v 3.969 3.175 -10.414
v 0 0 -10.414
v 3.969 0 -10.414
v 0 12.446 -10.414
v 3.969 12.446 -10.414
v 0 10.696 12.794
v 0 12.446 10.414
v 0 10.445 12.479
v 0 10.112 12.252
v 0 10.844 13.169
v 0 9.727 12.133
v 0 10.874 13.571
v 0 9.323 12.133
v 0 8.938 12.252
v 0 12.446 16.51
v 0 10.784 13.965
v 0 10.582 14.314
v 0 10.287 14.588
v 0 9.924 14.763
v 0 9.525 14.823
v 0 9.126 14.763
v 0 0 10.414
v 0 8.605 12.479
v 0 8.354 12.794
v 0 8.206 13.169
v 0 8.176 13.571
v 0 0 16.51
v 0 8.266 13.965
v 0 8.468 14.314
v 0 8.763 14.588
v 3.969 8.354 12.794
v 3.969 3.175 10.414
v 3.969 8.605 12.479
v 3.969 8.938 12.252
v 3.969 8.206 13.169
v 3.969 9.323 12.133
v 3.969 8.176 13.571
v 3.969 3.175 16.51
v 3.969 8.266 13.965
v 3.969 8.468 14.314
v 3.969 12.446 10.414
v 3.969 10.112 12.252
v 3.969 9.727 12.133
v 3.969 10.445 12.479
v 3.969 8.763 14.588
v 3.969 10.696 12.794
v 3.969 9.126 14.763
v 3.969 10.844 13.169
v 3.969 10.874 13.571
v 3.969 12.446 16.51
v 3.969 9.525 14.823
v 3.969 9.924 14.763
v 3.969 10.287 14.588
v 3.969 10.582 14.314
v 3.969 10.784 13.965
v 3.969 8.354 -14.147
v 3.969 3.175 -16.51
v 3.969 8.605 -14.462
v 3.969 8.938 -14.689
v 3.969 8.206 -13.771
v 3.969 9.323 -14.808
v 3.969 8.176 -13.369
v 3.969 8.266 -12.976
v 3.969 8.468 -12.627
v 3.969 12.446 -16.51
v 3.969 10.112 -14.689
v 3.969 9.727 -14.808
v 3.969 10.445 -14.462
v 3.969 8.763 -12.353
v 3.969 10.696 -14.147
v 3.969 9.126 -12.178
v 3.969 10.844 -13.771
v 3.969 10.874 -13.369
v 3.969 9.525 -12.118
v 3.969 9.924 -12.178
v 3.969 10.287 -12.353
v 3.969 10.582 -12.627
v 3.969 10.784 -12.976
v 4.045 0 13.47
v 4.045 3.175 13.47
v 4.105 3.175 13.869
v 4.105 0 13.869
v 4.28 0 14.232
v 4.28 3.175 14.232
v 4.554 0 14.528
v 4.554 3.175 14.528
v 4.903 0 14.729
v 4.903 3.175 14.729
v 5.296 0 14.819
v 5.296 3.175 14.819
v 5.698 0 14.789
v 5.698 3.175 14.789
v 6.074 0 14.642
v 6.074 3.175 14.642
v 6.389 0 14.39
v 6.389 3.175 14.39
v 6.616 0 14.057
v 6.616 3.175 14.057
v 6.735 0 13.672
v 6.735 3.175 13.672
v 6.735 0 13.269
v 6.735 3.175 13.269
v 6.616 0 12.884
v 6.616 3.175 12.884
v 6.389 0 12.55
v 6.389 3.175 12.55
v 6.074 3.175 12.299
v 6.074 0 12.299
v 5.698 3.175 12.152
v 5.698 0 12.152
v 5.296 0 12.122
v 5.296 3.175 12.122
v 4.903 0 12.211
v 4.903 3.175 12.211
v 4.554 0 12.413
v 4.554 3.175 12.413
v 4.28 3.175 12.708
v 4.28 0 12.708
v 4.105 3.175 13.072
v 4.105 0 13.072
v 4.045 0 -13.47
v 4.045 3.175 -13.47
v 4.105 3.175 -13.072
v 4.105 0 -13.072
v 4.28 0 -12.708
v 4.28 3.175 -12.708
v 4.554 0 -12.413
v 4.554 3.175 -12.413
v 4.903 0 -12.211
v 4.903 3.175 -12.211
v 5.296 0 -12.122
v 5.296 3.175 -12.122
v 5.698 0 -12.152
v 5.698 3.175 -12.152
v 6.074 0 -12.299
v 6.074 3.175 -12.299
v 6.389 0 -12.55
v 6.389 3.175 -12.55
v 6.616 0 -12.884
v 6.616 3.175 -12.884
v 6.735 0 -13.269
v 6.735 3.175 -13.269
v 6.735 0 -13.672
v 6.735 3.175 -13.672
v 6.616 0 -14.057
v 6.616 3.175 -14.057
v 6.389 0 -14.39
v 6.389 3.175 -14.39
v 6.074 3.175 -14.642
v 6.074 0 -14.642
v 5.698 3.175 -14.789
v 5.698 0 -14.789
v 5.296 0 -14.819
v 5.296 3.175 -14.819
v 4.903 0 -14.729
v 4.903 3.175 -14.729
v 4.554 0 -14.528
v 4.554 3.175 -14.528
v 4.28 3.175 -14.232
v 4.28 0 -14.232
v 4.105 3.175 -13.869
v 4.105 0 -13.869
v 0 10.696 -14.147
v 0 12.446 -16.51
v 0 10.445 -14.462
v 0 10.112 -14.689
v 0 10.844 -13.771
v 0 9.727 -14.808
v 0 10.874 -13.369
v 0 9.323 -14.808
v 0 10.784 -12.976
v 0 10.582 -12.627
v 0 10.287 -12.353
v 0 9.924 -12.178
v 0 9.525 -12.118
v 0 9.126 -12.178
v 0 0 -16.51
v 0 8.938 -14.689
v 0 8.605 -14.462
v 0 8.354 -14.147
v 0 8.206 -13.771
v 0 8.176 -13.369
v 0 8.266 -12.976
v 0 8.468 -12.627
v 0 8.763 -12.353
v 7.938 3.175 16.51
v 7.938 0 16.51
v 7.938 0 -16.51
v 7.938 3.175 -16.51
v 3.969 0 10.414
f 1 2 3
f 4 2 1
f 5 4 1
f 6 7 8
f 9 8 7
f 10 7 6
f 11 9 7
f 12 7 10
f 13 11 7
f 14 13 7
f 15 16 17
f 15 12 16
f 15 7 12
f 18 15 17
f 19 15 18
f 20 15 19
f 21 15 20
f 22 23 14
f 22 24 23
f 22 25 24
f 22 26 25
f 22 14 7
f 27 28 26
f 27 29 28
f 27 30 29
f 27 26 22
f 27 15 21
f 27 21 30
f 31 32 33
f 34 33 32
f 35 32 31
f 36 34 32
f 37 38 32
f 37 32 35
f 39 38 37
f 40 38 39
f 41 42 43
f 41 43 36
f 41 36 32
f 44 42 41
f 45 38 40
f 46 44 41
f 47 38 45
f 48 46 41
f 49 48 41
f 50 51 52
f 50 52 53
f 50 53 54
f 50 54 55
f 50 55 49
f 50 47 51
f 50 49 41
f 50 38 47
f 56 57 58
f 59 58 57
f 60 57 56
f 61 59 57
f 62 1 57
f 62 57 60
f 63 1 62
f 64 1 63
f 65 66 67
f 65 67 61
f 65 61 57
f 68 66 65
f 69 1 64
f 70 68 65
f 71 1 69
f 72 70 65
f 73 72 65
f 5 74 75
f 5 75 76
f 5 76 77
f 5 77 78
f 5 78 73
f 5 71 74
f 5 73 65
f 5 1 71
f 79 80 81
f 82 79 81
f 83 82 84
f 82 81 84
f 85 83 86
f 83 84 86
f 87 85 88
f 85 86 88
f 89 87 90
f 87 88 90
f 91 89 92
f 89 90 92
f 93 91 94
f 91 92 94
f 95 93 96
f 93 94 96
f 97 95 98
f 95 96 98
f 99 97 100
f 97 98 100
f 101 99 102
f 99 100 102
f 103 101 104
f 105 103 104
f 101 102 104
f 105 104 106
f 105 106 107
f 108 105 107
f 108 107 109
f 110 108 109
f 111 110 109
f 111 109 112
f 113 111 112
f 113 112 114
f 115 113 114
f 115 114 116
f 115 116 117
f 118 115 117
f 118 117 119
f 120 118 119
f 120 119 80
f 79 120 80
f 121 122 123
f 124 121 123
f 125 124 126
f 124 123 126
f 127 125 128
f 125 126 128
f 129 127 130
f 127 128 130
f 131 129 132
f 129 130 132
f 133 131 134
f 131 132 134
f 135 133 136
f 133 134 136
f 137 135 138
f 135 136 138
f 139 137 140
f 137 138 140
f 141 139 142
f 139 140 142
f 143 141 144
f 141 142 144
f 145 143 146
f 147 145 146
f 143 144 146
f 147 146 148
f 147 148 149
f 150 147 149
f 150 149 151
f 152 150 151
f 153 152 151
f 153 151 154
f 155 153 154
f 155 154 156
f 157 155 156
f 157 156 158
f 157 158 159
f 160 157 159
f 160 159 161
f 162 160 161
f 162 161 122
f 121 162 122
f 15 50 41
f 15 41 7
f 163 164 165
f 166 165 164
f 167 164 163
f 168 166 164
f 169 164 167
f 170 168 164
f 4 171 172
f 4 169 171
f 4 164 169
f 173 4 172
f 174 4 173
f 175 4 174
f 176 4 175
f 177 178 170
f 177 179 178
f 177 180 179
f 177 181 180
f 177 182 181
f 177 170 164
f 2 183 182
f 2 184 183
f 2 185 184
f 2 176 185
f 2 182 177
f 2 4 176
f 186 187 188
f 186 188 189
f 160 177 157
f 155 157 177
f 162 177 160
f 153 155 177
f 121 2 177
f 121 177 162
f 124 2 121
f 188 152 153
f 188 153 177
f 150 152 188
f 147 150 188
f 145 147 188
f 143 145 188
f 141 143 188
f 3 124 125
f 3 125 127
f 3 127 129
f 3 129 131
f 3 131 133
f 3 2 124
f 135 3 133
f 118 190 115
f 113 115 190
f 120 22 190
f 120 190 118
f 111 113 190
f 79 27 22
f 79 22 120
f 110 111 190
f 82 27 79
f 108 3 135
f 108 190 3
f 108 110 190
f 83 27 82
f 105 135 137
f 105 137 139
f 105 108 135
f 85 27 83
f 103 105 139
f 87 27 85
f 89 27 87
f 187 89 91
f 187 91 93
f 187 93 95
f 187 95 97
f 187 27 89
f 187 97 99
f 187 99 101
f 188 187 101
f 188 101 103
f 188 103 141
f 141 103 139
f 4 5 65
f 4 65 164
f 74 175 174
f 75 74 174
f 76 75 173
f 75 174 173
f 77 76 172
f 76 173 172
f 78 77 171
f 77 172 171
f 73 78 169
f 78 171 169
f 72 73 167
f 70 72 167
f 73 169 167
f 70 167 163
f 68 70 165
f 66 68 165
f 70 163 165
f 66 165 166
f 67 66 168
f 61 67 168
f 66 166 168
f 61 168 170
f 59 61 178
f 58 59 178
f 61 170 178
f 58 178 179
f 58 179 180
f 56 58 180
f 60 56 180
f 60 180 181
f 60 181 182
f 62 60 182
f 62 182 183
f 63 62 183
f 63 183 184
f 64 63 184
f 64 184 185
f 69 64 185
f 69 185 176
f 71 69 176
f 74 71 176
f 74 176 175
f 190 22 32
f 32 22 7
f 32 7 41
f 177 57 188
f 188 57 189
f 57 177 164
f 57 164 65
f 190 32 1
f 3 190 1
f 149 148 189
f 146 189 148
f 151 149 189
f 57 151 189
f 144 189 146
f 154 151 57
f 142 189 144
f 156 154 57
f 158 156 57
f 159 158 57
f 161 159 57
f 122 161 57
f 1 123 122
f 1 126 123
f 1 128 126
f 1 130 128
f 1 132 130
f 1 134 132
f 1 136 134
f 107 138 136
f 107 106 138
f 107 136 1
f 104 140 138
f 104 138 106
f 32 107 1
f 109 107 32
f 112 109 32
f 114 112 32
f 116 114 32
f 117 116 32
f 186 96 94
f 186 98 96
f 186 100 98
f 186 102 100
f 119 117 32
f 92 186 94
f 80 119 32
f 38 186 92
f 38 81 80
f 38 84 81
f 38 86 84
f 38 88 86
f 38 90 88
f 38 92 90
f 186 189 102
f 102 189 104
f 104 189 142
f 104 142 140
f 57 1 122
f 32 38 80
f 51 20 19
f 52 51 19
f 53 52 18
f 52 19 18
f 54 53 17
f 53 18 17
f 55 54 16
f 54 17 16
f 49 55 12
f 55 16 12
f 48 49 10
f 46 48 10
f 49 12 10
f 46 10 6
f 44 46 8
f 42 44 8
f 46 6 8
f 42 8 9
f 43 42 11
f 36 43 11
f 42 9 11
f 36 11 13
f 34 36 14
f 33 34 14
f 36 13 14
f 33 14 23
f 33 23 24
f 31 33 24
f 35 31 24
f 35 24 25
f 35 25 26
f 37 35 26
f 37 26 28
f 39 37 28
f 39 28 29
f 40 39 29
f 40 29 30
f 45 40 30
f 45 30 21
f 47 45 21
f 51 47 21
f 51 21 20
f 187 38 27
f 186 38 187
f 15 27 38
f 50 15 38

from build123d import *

# Parameters (mm, degrees)
BOSS_EXTRUDE1_DEPTH       = 16.51
CUT_EXTRUDE1_REACH        = 14.446
SKETCH2_W                 = 3.96875
SKETCH2_H                 = 20.828
F_6_32_TAPPED_HOLE1_D     = 2.7051
F_6_32_TAPPED_HOLE1_DEPTH = 3.96875
F_6_32_TAPPED_HOLE2_D     = 2.7051
F_6_32_TAPPED_HOLE2_DEPTH = 3.175


with BuildPart() as part:
    # Sketch1 → Boss-Extrude1 (new body, symmetric)
    with BuildSketch(Plane.XY):
        Polygon((0, 12.446), (0, 0), (7.9375, 0), (7.9375, 3.175), (3.96875, 3.175), (3.96875, 12.446), align=None)
    extrude(amount=BOSS_EXTRUDE1_DEPTH, both=True)

    # Sketch2 → Cut-Extrude1 (cut, up to next)
    with BuildSketch(Plane(origin=(0, 12.446, 0), x_dir=(1, 0, 0), z_dir=(0, 1, 0)), mode=Mode.PRIVATE) as cut_extrude1_sk1:
        with Locations((1.984375, 0)):
            Rectangle(SKETCH2_W, SKETCH2_H)
    cut_extrude1_tool1 = extrude(cut_extrude1_sk1.sketch, amount=-CUT_EXTRUDE1_REACH, mode=Mode.PRIVATE) & part.part
    add(cut_extrude1_tool1.solids().sort_by_distance((1.984375, 12.446, 0))[0], mode=Mode.SUBTRACT)

    # #6-32 Tapped Hole1
    with Locations(Plane(origin=(3.96875, 0, 0), x_dir=(0, 0, -1), z_dir=(1, 0, 0))):
        with Locations((-13.470384182, 9.525), (13.470384182, 9.525)):
            Hole(F_6_32_TAPPED_HOLE1_D / 2, depth=F_6_32_TAPPED_HOLE1_DEPTH)

    # #6-32 Tapped Hole2
    with Locations(Plane.XZ):
        with Locations((5.3975, 13.470384182), (5.3975, -13.470384182)):
            Hole(F_6_32_TAPPED_HOLE2_D / 2, depth=F_6_32_TAPPED_HOLE2_DEPTH)


solid = part.part
